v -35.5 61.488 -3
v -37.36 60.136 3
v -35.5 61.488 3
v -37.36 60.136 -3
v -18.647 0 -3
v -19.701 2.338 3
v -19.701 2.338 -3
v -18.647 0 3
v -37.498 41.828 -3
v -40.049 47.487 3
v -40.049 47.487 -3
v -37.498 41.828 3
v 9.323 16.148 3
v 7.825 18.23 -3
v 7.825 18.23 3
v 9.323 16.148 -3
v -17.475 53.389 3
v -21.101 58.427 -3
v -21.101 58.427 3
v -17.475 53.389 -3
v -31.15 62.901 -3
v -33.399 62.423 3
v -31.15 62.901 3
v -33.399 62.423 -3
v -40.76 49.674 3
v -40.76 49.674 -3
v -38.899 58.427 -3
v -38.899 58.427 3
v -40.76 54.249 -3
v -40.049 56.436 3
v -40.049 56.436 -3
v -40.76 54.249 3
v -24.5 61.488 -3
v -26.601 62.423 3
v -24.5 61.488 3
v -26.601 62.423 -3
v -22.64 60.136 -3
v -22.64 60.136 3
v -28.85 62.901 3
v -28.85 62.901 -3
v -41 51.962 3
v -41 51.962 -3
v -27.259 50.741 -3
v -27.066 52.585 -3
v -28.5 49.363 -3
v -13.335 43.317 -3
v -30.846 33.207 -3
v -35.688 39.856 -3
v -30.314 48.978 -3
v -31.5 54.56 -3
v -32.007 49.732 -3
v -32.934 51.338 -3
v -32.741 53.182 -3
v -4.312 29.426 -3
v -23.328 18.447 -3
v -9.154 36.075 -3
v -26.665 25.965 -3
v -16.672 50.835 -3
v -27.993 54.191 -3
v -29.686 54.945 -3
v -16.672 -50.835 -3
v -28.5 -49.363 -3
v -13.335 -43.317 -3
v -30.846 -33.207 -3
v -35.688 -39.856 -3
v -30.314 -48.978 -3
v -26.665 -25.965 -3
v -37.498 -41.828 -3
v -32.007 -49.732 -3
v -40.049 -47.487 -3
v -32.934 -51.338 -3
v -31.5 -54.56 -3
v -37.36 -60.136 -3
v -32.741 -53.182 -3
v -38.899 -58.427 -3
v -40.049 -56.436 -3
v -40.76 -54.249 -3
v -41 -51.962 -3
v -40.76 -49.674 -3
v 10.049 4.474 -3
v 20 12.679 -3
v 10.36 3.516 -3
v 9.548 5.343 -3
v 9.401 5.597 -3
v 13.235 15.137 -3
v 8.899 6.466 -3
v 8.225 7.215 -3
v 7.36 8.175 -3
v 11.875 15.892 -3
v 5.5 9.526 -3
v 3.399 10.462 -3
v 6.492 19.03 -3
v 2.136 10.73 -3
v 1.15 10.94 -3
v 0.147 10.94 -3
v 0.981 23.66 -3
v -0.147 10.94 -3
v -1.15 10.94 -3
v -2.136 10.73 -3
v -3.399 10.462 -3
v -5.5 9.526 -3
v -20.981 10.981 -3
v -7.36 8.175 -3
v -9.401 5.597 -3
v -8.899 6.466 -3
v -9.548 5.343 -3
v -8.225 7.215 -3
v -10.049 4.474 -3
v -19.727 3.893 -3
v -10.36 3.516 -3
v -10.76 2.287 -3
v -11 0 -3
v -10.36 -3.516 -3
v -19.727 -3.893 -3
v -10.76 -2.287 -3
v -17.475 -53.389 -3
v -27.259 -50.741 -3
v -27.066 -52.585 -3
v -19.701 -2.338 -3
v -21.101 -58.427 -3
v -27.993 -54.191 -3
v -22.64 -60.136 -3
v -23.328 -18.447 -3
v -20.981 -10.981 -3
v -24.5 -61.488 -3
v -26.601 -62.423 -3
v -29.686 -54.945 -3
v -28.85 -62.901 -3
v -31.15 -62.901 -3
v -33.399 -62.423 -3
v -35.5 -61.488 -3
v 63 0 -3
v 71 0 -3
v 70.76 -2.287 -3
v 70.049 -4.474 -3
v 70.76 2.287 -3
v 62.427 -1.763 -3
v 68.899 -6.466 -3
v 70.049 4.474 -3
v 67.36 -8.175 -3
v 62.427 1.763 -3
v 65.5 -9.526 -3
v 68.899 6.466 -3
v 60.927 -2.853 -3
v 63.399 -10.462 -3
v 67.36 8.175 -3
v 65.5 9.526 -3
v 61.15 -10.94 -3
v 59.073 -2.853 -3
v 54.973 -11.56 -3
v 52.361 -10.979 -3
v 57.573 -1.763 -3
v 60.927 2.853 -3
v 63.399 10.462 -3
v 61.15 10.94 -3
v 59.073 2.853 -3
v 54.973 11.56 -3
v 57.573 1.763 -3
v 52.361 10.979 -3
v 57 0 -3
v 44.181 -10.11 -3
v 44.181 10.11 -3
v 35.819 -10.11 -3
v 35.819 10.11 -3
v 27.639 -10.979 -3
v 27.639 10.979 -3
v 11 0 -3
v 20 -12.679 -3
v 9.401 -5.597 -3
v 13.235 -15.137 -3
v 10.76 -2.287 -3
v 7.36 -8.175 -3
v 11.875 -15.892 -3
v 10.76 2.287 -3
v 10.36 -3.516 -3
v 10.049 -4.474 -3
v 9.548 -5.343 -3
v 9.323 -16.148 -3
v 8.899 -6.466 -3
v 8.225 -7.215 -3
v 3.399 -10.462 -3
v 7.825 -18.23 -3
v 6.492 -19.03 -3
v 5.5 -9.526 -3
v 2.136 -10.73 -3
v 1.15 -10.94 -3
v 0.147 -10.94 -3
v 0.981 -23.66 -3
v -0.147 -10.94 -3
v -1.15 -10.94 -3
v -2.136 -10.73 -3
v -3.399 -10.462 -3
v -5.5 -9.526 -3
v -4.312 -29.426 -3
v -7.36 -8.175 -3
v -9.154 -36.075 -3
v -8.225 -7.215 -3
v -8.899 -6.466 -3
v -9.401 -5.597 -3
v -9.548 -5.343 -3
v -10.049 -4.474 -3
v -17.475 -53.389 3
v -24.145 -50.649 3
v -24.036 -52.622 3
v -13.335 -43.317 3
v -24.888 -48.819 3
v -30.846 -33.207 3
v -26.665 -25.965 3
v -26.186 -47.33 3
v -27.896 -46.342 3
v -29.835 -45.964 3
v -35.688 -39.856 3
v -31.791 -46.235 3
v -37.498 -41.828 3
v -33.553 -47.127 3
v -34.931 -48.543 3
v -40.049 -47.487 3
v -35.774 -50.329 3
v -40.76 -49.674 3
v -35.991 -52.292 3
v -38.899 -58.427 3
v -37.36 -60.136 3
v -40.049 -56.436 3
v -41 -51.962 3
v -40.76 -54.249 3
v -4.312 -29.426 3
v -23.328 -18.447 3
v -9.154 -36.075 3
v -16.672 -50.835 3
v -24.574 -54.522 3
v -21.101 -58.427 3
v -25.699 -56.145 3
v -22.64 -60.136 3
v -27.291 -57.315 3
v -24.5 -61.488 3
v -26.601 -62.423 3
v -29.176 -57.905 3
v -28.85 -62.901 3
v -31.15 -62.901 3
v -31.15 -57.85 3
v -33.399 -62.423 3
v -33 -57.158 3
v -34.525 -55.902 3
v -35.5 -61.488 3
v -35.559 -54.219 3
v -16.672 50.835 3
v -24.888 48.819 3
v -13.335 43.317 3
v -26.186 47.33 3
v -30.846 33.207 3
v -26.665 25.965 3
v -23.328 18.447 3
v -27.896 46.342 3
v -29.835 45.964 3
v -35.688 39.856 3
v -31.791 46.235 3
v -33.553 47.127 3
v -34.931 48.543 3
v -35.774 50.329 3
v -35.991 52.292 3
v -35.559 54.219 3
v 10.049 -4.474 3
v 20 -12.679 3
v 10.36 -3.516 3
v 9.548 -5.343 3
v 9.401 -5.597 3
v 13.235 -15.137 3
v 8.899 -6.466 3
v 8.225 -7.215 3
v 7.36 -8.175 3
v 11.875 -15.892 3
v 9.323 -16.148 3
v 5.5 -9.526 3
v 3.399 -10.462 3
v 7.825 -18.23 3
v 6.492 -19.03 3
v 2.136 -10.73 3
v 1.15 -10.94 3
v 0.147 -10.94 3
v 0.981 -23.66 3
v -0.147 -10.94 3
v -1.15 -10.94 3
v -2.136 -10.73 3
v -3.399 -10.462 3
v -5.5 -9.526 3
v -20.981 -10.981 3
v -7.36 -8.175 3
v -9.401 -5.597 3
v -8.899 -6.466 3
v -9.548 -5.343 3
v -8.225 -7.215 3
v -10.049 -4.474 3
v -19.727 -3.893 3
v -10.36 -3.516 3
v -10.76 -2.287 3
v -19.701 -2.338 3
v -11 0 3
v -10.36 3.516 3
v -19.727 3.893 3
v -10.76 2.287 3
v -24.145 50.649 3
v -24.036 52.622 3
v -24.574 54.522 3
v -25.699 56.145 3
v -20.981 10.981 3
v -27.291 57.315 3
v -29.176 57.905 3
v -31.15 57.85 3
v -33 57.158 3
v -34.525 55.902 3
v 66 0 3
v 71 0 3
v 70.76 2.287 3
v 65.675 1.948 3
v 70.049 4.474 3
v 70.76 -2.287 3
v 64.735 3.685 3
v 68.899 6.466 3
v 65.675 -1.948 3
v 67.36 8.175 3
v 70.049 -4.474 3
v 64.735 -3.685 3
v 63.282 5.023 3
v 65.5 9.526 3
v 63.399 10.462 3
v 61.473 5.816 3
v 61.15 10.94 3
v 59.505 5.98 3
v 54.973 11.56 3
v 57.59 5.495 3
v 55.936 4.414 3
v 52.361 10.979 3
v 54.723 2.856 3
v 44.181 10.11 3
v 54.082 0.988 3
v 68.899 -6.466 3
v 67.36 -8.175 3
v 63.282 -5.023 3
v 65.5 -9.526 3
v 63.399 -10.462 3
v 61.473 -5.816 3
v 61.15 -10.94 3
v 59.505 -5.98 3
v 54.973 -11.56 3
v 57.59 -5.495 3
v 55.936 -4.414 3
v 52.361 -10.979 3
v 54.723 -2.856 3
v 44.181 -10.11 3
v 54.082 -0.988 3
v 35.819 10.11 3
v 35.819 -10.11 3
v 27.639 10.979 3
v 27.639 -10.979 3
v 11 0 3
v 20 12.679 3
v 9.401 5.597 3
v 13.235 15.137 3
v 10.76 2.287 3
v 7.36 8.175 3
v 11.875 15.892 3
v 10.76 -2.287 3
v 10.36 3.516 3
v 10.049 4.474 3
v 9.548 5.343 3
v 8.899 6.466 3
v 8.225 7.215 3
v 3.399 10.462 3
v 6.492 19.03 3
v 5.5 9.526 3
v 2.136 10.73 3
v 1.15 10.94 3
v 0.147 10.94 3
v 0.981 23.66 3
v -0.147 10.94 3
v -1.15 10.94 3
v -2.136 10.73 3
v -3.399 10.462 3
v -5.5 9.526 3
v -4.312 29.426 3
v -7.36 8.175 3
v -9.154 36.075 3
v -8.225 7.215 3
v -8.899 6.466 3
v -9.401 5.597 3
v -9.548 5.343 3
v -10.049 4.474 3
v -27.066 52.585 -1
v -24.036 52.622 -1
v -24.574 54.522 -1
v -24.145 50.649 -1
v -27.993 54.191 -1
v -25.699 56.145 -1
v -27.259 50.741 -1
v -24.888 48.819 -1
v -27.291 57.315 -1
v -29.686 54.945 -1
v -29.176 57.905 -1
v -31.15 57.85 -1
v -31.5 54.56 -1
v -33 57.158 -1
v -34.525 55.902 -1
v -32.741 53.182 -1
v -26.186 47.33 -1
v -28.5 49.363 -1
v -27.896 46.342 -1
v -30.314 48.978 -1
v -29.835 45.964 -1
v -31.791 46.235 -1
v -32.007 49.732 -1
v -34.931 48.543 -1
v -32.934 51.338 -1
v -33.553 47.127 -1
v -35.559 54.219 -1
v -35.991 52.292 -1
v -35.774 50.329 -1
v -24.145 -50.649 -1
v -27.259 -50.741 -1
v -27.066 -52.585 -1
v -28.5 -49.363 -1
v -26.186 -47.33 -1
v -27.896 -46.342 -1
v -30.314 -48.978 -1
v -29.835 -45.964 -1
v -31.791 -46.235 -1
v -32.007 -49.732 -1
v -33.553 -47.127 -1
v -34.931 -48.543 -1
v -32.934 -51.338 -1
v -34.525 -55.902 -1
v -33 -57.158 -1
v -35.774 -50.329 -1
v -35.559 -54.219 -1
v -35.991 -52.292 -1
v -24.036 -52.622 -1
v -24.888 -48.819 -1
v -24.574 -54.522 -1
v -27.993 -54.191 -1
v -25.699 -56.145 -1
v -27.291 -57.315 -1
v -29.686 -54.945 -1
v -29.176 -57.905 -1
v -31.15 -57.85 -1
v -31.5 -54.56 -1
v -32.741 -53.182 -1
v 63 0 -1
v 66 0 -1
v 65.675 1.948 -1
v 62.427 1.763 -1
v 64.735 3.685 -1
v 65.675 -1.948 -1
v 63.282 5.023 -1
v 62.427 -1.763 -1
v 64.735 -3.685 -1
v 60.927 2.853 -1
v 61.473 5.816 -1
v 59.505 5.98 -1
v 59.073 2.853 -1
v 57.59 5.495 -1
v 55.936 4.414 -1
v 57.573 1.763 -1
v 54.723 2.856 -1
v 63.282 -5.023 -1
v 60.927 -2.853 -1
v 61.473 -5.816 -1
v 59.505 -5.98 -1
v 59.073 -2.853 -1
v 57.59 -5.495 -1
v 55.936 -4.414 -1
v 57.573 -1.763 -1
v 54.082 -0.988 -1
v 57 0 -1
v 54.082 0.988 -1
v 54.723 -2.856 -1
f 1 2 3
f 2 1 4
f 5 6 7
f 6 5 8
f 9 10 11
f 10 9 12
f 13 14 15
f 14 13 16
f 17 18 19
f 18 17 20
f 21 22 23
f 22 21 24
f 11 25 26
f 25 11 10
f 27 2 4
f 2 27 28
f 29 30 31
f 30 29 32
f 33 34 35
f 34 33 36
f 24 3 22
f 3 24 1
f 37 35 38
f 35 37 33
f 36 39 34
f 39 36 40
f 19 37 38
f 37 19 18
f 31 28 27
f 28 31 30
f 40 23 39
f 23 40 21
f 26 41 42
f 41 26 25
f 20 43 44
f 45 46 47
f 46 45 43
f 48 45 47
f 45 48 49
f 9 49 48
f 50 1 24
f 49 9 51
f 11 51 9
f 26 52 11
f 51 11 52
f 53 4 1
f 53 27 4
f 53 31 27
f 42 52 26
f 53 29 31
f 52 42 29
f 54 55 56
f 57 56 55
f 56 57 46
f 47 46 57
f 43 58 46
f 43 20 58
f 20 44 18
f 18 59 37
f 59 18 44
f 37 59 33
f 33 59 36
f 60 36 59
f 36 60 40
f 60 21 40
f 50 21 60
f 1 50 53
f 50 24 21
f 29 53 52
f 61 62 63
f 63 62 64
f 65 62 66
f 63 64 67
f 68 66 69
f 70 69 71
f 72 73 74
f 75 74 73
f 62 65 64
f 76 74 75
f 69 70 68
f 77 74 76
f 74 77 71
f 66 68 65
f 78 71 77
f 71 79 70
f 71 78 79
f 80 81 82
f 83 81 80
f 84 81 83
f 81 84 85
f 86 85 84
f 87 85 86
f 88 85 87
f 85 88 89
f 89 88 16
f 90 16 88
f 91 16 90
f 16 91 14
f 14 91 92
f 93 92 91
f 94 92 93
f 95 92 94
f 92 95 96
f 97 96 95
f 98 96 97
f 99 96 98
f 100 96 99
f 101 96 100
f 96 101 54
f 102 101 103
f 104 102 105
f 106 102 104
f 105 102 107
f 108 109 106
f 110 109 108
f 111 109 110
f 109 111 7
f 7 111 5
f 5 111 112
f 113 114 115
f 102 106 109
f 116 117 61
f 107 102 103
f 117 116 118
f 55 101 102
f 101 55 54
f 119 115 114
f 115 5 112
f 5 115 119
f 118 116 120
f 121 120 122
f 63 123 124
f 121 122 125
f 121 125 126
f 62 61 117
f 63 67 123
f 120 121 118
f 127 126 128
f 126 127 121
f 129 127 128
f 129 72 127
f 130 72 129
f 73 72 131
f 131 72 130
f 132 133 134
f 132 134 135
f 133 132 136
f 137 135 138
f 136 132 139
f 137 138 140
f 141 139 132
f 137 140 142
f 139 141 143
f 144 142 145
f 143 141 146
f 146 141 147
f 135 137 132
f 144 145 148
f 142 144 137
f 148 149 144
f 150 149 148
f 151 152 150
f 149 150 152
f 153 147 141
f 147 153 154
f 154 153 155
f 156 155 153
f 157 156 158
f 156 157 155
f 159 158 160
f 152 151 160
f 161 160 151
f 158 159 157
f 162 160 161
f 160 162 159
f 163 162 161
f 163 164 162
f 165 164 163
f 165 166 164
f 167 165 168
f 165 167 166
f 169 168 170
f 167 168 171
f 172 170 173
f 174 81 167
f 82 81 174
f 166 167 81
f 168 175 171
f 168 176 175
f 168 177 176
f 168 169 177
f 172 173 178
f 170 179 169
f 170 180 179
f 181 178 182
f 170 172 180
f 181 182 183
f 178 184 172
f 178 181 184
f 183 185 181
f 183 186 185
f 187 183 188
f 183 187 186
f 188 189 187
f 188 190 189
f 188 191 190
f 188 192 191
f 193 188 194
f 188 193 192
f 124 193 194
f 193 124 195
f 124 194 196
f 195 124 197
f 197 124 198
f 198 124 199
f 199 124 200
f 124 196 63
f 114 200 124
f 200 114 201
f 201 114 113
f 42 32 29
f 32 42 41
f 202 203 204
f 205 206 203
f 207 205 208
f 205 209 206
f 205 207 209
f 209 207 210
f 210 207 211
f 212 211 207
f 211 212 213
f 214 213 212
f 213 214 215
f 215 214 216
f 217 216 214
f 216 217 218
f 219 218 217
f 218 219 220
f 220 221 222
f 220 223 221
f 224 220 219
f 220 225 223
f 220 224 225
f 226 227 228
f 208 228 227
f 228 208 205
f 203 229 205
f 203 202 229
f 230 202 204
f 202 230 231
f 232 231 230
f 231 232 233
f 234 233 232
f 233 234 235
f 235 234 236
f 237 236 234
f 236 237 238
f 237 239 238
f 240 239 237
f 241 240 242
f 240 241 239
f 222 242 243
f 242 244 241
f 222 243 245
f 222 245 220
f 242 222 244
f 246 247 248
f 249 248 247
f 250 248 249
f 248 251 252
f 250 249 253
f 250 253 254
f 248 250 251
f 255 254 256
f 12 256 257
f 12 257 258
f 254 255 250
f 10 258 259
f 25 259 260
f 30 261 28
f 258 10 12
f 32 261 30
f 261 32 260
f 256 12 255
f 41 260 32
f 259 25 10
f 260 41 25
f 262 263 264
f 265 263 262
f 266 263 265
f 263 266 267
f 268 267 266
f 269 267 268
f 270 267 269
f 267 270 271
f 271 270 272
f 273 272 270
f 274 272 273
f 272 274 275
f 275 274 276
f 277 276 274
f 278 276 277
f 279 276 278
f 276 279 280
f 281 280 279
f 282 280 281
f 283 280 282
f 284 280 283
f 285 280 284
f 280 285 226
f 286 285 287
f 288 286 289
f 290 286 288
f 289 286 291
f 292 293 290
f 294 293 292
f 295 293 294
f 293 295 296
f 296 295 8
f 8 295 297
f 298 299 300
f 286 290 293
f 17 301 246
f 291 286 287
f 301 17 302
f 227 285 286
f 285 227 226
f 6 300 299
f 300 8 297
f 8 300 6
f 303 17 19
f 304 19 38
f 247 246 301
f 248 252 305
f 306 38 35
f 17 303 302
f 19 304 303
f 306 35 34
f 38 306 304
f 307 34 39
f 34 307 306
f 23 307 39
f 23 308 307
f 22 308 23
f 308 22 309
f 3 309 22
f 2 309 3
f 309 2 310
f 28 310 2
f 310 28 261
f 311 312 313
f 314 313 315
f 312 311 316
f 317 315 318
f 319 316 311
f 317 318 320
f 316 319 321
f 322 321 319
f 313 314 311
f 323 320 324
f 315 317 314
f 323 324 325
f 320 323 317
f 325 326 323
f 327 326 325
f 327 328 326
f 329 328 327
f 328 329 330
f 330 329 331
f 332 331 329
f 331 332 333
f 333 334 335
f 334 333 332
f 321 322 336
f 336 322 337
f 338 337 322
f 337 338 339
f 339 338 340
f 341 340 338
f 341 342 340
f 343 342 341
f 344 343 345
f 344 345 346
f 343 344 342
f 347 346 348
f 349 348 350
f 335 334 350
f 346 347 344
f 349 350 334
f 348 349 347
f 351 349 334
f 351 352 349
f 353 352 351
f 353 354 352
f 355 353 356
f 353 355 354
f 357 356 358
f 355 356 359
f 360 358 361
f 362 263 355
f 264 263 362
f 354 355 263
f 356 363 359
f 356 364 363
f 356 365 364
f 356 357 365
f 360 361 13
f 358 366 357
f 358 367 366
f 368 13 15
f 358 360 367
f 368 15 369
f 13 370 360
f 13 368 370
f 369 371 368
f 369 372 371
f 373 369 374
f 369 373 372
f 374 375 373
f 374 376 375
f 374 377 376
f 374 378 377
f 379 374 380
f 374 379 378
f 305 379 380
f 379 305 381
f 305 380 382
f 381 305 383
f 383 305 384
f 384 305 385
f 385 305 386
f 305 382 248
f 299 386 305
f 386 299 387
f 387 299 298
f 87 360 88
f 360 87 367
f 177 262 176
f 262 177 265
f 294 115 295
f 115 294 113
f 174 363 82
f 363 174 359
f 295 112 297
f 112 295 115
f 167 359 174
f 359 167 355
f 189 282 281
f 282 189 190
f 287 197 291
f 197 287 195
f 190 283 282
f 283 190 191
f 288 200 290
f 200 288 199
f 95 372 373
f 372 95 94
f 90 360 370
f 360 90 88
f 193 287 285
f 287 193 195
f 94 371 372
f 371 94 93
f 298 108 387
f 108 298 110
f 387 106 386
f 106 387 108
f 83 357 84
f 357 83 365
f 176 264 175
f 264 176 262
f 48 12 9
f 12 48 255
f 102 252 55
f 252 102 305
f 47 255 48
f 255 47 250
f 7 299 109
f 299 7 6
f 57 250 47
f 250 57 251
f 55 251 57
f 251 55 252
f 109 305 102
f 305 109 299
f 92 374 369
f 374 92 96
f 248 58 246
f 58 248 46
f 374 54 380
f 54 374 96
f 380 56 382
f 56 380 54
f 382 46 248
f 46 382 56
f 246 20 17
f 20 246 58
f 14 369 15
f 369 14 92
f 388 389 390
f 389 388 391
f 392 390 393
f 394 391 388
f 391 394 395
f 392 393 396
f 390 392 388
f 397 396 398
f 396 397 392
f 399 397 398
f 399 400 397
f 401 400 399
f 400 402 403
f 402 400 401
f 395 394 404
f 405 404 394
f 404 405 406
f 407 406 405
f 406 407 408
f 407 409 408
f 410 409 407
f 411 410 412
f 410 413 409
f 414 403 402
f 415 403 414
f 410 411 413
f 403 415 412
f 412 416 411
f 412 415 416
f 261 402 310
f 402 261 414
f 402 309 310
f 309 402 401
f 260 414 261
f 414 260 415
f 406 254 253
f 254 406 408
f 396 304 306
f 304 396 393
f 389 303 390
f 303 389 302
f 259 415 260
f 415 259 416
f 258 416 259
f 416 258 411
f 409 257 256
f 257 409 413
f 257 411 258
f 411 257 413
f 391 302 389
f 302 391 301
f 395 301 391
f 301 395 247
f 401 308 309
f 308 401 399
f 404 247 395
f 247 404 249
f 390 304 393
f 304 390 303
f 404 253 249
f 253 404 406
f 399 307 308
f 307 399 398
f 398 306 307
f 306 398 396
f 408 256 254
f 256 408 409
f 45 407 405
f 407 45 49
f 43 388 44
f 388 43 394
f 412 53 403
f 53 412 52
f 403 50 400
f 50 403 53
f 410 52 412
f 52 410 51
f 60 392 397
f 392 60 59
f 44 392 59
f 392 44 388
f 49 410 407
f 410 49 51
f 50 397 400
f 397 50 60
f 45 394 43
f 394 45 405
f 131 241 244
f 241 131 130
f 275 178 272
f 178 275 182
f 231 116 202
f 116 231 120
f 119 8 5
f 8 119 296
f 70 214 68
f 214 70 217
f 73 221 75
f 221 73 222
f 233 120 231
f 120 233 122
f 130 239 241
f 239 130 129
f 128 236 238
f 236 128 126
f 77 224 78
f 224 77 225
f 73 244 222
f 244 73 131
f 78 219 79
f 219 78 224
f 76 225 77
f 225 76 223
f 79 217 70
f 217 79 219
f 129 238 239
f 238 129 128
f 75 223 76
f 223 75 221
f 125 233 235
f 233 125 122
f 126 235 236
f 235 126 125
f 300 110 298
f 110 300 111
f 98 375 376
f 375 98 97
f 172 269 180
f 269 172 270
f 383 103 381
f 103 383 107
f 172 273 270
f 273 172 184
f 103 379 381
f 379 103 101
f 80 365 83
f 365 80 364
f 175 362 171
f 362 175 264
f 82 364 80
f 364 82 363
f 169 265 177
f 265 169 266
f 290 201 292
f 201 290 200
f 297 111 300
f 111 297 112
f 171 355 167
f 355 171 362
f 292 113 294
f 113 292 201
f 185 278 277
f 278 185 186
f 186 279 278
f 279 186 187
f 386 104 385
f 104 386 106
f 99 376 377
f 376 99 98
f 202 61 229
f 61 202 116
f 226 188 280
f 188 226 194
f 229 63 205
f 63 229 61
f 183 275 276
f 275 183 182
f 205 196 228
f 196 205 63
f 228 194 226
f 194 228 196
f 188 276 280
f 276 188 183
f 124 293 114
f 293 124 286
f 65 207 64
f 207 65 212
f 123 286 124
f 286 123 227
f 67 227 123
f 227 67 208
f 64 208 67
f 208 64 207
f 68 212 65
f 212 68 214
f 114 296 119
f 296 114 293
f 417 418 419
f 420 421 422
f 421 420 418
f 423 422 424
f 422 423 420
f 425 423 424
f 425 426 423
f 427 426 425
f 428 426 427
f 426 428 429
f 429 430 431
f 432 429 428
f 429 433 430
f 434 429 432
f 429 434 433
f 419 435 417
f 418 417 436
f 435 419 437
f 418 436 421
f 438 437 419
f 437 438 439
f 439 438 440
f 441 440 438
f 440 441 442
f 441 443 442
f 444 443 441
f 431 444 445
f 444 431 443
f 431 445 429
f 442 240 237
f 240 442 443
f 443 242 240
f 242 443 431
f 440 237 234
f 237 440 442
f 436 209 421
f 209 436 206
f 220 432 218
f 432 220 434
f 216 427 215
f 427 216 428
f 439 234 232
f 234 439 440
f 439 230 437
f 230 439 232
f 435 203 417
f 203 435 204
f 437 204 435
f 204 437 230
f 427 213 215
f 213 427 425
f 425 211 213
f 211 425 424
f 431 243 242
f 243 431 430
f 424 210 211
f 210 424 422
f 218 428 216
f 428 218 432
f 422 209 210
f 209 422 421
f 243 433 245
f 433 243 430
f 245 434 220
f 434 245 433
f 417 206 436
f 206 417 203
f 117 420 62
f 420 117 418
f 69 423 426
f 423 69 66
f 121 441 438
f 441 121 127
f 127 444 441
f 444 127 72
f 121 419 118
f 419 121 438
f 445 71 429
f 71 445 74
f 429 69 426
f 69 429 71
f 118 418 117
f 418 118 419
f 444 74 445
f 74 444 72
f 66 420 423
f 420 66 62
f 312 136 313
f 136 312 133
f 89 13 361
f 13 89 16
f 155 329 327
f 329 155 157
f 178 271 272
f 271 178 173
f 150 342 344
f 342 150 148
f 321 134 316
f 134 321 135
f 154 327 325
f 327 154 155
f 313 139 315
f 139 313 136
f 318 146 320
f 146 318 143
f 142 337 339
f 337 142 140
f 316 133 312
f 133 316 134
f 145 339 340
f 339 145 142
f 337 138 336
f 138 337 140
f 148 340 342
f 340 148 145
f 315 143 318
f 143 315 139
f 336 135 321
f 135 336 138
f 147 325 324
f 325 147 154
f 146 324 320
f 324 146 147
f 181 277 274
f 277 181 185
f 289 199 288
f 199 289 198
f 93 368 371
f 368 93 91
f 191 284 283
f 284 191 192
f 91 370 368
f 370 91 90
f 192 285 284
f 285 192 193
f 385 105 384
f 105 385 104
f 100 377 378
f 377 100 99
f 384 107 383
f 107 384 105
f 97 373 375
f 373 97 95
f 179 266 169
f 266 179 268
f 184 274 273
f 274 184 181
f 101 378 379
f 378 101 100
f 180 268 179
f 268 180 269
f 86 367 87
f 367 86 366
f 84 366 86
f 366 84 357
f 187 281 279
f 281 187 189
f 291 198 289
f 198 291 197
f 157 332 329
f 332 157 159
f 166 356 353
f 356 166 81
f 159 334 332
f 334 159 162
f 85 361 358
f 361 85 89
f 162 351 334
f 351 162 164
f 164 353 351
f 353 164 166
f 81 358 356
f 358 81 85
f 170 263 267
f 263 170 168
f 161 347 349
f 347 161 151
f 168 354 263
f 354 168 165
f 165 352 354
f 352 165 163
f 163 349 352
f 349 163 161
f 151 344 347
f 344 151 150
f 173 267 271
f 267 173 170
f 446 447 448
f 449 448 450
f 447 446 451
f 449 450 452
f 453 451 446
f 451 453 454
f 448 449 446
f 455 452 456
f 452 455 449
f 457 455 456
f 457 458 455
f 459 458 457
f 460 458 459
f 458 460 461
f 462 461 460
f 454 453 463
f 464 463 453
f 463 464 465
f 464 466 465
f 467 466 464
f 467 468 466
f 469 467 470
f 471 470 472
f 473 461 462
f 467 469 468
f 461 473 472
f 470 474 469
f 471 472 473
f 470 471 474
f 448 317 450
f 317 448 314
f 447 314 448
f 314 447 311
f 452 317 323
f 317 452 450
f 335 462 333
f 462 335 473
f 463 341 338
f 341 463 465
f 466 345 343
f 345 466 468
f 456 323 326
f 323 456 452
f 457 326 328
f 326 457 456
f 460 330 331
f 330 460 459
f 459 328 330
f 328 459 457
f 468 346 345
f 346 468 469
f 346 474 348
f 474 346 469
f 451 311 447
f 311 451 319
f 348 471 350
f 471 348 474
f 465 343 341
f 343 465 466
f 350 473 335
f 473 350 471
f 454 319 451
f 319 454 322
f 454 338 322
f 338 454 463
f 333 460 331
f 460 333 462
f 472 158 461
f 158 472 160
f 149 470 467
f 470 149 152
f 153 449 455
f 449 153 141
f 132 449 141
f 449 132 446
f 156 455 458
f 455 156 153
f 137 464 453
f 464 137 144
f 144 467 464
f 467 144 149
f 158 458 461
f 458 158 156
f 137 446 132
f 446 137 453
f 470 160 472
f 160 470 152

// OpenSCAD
MARIME_CILINDRU_CENTRU = 22;
LUNGIME_BRATE = 60;
MARIME_CILINDRU_CAPAT_BRAT = 6;
NUMAR_BRATE = 3;

for(i=[1:1:NUMAR_BRATE] ){
    rotate([0,0,i*360/NUMAR_BRATE]) brat_spinner();
}

module brat_spinner(){
    difference(){
        difference(){
            difference(){
                hull(){
                    cylinder(r=MARIME_CILINDRU_CENTRU/2+6, h=6, center=true);
                    translate([LUNGIME_BRATE,0,0]) cylinder(r=MARIME_CILINDRU_CENTRU/2, h=6, center=true);
            }
            cylinder(r=MARIME_CILINDRU_CENTRU/2, h=9, center=true);
        }
        scale([2,1,1]){
            translate([LUNGIME_BRATE/3,LUNGIME_BRATE/2,0]) cylinder(r=LUNGIME_BRATE/3, h=18, center=true);
            translate([LUNGIME_BRATE/3,-LUNGIME_BRATE/2,0]) cylinder(r=LUNGIME_BRATE/3, h=18, center=true);
        }
    }
    translate([LUNGIME_BRATE,0,2]) cylinder(r=MARIME_CILINDRU_CAPAT_BRAT, h=6, center=true);
    translate([LUNGIME_BRATE,0,-1]) cylinder(r=MARIME_CILINDRU_CAPAT_BRAT/2, h=6, center=true); 
}
    
            
}
